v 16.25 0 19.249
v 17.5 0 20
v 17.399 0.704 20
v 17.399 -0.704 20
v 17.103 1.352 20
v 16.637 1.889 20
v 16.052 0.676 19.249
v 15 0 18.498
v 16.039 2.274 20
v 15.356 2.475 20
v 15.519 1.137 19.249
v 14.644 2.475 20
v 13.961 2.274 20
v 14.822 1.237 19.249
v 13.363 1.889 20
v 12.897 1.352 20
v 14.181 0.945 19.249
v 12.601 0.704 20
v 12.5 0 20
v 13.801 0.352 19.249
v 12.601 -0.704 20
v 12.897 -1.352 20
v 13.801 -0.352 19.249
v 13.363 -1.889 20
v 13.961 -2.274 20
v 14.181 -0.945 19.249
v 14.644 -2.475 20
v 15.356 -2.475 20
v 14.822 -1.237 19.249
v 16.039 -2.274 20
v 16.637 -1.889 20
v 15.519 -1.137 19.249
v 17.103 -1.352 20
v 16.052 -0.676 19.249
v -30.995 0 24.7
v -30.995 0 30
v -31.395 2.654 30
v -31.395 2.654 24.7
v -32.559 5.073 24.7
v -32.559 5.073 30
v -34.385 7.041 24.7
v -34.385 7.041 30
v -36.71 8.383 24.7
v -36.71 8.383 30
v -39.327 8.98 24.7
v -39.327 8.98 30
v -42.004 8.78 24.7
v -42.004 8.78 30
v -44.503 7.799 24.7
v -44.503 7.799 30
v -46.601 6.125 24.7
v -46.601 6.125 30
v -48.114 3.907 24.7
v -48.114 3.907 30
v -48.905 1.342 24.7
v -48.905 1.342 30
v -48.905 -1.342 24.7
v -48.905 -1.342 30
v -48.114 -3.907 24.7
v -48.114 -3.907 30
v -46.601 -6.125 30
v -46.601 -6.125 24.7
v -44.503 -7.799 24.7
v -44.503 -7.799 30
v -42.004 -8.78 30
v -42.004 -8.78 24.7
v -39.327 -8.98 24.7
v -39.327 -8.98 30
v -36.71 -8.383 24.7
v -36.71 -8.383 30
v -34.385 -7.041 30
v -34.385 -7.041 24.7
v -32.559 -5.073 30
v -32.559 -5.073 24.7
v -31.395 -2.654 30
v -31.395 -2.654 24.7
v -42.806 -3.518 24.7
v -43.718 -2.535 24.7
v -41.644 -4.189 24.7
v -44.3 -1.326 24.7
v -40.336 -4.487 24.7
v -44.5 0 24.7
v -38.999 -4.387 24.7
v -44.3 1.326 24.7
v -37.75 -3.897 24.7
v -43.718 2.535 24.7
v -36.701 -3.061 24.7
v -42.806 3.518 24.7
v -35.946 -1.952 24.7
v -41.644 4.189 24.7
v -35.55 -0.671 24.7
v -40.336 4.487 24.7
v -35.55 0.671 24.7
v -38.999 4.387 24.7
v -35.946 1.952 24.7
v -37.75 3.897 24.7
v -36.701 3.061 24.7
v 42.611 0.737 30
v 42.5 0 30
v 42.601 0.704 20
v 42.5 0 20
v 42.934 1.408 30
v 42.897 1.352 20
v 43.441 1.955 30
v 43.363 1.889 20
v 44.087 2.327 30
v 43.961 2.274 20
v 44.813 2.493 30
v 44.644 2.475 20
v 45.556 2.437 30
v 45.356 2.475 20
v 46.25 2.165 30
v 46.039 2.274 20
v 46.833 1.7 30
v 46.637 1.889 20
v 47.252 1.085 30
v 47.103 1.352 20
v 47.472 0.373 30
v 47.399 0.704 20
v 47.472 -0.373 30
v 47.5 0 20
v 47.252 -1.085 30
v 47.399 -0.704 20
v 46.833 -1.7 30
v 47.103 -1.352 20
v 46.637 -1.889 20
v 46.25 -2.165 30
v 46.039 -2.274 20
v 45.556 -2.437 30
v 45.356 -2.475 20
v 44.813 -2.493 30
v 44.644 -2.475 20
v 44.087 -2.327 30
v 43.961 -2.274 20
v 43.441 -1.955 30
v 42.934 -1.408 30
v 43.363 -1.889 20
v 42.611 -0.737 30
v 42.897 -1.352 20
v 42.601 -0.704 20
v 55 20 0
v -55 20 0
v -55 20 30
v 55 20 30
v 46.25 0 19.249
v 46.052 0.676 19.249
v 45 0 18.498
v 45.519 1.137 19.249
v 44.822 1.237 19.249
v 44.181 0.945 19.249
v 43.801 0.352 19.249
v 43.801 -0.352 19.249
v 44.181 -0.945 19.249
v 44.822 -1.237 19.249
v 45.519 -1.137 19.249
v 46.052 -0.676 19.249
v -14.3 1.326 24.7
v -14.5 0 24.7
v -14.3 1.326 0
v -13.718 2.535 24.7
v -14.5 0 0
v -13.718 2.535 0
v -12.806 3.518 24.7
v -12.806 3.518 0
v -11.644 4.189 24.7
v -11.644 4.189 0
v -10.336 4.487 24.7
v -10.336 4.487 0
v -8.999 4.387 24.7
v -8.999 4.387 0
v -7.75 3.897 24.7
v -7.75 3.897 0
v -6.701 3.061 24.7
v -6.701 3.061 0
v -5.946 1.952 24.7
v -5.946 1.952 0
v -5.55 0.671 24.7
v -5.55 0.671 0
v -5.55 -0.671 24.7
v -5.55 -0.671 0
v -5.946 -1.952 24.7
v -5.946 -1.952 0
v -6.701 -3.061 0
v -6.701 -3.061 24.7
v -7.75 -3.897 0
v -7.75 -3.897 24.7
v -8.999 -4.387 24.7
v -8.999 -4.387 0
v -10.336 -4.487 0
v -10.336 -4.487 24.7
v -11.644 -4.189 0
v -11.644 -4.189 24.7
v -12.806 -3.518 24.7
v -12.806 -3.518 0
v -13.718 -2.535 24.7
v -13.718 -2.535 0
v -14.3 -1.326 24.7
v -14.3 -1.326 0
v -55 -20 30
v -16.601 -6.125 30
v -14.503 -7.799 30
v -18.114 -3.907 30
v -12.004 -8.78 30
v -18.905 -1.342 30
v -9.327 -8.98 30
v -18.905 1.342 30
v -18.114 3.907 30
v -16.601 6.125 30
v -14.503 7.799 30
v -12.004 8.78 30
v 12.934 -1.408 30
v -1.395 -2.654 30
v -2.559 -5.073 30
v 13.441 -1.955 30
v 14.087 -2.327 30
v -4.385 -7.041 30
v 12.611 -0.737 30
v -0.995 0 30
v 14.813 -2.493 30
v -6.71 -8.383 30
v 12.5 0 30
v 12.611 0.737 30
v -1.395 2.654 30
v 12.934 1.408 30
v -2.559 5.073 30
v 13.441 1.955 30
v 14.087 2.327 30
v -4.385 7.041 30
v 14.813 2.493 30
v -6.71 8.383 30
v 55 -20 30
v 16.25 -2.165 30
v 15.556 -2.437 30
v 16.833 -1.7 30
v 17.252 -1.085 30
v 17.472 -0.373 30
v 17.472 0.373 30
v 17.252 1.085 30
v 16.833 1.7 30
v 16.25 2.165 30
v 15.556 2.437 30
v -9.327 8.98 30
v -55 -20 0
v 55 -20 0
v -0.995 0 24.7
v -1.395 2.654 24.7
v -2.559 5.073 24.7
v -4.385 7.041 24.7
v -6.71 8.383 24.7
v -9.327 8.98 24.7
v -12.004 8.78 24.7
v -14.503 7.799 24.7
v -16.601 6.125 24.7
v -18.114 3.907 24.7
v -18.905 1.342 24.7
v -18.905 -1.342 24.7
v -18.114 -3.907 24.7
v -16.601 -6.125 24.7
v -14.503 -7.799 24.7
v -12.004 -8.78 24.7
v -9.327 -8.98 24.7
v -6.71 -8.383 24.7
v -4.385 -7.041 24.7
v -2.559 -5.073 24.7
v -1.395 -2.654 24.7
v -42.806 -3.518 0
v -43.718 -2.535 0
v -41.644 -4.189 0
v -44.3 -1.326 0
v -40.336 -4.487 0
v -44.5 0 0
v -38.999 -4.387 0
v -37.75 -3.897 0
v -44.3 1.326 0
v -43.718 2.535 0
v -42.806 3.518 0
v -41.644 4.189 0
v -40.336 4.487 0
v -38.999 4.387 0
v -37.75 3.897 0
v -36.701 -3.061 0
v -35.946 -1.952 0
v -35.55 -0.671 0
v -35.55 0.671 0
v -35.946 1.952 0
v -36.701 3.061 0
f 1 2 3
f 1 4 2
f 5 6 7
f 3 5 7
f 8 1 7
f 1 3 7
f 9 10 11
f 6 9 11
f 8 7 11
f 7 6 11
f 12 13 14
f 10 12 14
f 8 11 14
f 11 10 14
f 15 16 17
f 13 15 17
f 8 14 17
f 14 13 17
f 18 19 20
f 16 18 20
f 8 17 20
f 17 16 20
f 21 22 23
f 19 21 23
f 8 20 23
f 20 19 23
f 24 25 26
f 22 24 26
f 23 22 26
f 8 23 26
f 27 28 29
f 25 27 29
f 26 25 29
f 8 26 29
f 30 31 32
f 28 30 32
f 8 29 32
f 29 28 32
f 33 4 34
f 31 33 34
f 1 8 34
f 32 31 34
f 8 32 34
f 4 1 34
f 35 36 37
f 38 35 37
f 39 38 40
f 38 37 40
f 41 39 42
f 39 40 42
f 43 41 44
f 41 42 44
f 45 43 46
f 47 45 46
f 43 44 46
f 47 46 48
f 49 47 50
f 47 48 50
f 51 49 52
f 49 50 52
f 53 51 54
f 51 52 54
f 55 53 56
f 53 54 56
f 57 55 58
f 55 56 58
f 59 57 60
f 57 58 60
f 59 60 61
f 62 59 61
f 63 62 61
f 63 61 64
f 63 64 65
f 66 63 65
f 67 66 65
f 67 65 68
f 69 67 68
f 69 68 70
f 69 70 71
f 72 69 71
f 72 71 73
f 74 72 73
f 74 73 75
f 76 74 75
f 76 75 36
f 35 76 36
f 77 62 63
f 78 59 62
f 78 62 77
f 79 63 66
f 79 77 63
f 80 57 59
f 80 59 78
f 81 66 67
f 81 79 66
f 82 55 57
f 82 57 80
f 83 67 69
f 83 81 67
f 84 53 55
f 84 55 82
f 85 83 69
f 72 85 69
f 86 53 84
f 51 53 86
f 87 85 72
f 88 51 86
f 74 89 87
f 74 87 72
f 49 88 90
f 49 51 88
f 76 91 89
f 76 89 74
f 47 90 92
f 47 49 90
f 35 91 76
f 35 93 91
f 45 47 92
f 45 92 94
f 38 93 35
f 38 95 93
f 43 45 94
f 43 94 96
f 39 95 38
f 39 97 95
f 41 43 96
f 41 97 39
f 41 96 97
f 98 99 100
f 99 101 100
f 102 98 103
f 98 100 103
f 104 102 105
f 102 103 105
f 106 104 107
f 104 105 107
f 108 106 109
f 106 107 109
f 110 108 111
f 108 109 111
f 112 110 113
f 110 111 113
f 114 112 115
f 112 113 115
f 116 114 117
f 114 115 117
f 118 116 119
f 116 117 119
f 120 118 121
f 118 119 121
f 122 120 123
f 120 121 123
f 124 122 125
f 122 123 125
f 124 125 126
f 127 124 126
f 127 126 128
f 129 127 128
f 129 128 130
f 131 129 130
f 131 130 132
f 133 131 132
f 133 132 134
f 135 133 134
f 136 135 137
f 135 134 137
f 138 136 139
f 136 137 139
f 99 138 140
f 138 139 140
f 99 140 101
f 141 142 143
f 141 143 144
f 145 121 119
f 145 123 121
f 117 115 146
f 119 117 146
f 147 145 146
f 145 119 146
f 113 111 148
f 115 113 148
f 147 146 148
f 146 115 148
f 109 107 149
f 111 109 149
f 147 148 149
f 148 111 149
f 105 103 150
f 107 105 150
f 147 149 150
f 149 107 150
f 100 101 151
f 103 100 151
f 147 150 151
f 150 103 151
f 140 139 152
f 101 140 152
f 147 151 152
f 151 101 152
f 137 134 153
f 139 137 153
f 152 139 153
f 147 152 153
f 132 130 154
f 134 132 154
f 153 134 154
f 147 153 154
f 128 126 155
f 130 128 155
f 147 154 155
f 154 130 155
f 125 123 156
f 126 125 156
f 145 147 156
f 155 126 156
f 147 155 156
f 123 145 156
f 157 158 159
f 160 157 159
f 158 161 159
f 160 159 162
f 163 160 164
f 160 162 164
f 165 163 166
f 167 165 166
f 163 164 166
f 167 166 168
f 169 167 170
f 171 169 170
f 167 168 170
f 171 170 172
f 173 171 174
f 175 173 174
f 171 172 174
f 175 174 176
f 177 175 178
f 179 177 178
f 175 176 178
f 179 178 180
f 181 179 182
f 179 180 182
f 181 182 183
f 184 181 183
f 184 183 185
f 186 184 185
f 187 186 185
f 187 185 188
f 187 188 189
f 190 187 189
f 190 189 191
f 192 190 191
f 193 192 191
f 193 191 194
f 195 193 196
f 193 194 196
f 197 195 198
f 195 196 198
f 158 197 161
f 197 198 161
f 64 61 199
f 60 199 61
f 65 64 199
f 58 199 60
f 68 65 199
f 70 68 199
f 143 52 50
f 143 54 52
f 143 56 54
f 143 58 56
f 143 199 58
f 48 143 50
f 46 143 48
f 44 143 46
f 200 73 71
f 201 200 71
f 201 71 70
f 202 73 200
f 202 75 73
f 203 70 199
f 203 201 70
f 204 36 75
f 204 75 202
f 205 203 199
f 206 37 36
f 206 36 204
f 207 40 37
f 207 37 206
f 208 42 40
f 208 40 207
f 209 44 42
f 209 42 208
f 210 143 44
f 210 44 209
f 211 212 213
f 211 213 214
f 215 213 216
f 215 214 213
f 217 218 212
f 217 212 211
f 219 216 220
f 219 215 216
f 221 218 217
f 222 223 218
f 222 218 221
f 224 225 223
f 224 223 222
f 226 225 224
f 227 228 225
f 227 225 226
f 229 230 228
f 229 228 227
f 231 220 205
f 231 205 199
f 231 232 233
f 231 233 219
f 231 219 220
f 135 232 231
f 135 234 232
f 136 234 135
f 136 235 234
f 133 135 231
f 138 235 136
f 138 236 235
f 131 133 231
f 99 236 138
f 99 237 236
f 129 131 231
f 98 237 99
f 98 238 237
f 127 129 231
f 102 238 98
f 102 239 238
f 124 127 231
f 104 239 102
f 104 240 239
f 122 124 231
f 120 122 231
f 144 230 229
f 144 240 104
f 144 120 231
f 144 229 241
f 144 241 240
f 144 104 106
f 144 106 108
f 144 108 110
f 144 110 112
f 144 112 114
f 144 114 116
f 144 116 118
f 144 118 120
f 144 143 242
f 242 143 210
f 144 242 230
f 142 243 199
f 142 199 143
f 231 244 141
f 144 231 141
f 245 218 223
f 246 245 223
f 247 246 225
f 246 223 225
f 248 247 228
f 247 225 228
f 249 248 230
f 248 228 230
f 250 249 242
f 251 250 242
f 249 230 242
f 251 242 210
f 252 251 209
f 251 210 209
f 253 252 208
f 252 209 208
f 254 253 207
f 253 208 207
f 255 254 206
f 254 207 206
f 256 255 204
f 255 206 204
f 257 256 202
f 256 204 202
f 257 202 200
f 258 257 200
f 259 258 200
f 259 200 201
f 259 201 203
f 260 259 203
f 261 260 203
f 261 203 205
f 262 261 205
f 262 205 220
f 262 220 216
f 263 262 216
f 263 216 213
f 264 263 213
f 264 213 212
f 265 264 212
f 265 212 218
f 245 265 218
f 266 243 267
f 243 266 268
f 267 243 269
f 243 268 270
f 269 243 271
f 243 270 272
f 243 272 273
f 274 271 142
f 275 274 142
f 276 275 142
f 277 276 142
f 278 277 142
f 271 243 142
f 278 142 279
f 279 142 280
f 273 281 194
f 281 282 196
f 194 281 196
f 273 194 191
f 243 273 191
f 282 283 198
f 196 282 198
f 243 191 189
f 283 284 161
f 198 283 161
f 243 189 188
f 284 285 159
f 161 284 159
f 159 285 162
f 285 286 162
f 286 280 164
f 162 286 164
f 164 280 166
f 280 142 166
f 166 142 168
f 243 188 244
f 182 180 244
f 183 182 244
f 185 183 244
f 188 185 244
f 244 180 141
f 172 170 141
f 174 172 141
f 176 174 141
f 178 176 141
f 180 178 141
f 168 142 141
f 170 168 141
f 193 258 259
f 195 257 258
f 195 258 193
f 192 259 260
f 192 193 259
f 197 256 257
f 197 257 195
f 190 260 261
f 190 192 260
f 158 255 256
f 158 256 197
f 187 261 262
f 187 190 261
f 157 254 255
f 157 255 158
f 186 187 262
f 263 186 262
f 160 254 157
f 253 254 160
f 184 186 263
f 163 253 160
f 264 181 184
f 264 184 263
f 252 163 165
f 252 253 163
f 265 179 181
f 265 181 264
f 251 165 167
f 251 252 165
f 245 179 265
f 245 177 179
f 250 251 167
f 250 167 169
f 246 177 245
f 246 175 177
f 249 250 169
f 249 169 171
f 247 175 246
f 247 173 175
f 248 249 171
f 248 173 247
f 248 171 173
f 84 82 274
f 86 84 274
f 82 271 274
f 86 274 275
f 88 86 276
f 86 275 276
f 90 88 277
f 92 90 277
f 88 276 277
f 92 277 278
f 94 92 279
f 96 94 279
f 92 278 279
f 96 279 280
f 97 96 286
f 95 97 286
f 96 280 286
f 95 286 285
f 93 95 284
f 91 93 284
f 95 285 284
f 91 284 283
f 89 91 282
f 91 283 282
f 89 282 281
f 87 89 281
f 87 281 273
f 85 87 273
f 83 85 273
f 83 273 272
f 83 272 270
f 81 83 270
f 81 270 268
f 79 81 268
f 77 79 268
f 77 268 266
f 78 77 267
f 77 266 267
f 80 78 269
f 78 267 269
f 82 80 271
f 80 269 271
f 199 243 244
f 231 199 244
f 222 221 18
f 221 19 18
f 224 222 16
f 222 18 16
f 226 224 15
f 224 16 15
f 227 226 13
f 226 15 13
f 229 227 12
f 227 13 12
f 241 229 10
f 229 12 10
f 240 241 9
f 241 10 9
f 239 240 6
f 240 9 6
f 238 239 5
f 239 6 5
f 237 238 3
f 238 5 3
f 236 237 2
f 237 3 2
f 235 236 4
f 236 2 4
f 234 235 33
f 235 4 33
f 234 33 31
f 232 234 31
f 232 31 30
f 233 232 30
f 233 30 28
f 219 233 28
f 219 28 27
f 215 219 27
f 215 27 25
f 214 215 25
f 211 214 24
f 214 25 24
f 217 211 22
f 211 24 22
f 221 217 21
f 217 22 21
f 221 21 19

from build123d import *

# Parameters (mm, degrees)
SKETCH1_W                               = 110
SKETCH1_H                               = 40
BRACKET_DEPTH                           = 30
CBORE_FOR_M8_HEX_HEAD_BOLT1_D           = 9
CBORE_FOR_M8_HEX_HEAD_BOLT1_CBORE_D     = 18.011
CBORE_FOR_M8_HEX_HEAD_BOLT1_CBORE_DEPTH = 5.3
M6_TAPPED_HOLE1_D                       = 5
M6_TAPPED_HOLE1_DEPTH                   = 10
M6_TAPPED_HOLE1_TIP                     = 1.502151548


with BuildPart() as part:
    # Sketch1 → BRACKET (new body)
    with BuildSketch(Plane.XY):
        Rectangle(SKETCH1_W, SKETCH1_H)
    extrude(amount=BRACKET_DEPTH)

    # CBORE for M8 Hex Head Bolt1 (through all)
    with Locations(Plane.XY.offset(30)):
        with Locations((-40, 0), (-10, 0)):
            CounterBoreHole(CBORE_FOR_M8_HEX_HEAD_BOLT1_D / 2, CBORE_FOR_M8_HEX_HEAD_BOLT1_CBORE_D / 2, CBORE_FOR_M8_HEX_HEAD_BOLT1_CBORE_DEPTH)

    # M6 Tapped Hole1
    with Locations(Plane.XY.offset(30)):
        with Locations((15, 0), (45, 0)):
            Hole(M6_TAPPED_HOLE1_D / 2, depth=M6_TAPPED_HOLE1_DEPTH)
            with Locations((0, 0, -(M6_TAPPED_HOLE1_DEPTH + M6_TAPPED_HOLE1_TIP / 2))):  # 118° drill point
                Cone(0, M6_TAPPED_HOLE1_D / 2, M6_TAPPED_HOLE1_TIP, mode=Mode.SUBTRACT)


solid = part.part
